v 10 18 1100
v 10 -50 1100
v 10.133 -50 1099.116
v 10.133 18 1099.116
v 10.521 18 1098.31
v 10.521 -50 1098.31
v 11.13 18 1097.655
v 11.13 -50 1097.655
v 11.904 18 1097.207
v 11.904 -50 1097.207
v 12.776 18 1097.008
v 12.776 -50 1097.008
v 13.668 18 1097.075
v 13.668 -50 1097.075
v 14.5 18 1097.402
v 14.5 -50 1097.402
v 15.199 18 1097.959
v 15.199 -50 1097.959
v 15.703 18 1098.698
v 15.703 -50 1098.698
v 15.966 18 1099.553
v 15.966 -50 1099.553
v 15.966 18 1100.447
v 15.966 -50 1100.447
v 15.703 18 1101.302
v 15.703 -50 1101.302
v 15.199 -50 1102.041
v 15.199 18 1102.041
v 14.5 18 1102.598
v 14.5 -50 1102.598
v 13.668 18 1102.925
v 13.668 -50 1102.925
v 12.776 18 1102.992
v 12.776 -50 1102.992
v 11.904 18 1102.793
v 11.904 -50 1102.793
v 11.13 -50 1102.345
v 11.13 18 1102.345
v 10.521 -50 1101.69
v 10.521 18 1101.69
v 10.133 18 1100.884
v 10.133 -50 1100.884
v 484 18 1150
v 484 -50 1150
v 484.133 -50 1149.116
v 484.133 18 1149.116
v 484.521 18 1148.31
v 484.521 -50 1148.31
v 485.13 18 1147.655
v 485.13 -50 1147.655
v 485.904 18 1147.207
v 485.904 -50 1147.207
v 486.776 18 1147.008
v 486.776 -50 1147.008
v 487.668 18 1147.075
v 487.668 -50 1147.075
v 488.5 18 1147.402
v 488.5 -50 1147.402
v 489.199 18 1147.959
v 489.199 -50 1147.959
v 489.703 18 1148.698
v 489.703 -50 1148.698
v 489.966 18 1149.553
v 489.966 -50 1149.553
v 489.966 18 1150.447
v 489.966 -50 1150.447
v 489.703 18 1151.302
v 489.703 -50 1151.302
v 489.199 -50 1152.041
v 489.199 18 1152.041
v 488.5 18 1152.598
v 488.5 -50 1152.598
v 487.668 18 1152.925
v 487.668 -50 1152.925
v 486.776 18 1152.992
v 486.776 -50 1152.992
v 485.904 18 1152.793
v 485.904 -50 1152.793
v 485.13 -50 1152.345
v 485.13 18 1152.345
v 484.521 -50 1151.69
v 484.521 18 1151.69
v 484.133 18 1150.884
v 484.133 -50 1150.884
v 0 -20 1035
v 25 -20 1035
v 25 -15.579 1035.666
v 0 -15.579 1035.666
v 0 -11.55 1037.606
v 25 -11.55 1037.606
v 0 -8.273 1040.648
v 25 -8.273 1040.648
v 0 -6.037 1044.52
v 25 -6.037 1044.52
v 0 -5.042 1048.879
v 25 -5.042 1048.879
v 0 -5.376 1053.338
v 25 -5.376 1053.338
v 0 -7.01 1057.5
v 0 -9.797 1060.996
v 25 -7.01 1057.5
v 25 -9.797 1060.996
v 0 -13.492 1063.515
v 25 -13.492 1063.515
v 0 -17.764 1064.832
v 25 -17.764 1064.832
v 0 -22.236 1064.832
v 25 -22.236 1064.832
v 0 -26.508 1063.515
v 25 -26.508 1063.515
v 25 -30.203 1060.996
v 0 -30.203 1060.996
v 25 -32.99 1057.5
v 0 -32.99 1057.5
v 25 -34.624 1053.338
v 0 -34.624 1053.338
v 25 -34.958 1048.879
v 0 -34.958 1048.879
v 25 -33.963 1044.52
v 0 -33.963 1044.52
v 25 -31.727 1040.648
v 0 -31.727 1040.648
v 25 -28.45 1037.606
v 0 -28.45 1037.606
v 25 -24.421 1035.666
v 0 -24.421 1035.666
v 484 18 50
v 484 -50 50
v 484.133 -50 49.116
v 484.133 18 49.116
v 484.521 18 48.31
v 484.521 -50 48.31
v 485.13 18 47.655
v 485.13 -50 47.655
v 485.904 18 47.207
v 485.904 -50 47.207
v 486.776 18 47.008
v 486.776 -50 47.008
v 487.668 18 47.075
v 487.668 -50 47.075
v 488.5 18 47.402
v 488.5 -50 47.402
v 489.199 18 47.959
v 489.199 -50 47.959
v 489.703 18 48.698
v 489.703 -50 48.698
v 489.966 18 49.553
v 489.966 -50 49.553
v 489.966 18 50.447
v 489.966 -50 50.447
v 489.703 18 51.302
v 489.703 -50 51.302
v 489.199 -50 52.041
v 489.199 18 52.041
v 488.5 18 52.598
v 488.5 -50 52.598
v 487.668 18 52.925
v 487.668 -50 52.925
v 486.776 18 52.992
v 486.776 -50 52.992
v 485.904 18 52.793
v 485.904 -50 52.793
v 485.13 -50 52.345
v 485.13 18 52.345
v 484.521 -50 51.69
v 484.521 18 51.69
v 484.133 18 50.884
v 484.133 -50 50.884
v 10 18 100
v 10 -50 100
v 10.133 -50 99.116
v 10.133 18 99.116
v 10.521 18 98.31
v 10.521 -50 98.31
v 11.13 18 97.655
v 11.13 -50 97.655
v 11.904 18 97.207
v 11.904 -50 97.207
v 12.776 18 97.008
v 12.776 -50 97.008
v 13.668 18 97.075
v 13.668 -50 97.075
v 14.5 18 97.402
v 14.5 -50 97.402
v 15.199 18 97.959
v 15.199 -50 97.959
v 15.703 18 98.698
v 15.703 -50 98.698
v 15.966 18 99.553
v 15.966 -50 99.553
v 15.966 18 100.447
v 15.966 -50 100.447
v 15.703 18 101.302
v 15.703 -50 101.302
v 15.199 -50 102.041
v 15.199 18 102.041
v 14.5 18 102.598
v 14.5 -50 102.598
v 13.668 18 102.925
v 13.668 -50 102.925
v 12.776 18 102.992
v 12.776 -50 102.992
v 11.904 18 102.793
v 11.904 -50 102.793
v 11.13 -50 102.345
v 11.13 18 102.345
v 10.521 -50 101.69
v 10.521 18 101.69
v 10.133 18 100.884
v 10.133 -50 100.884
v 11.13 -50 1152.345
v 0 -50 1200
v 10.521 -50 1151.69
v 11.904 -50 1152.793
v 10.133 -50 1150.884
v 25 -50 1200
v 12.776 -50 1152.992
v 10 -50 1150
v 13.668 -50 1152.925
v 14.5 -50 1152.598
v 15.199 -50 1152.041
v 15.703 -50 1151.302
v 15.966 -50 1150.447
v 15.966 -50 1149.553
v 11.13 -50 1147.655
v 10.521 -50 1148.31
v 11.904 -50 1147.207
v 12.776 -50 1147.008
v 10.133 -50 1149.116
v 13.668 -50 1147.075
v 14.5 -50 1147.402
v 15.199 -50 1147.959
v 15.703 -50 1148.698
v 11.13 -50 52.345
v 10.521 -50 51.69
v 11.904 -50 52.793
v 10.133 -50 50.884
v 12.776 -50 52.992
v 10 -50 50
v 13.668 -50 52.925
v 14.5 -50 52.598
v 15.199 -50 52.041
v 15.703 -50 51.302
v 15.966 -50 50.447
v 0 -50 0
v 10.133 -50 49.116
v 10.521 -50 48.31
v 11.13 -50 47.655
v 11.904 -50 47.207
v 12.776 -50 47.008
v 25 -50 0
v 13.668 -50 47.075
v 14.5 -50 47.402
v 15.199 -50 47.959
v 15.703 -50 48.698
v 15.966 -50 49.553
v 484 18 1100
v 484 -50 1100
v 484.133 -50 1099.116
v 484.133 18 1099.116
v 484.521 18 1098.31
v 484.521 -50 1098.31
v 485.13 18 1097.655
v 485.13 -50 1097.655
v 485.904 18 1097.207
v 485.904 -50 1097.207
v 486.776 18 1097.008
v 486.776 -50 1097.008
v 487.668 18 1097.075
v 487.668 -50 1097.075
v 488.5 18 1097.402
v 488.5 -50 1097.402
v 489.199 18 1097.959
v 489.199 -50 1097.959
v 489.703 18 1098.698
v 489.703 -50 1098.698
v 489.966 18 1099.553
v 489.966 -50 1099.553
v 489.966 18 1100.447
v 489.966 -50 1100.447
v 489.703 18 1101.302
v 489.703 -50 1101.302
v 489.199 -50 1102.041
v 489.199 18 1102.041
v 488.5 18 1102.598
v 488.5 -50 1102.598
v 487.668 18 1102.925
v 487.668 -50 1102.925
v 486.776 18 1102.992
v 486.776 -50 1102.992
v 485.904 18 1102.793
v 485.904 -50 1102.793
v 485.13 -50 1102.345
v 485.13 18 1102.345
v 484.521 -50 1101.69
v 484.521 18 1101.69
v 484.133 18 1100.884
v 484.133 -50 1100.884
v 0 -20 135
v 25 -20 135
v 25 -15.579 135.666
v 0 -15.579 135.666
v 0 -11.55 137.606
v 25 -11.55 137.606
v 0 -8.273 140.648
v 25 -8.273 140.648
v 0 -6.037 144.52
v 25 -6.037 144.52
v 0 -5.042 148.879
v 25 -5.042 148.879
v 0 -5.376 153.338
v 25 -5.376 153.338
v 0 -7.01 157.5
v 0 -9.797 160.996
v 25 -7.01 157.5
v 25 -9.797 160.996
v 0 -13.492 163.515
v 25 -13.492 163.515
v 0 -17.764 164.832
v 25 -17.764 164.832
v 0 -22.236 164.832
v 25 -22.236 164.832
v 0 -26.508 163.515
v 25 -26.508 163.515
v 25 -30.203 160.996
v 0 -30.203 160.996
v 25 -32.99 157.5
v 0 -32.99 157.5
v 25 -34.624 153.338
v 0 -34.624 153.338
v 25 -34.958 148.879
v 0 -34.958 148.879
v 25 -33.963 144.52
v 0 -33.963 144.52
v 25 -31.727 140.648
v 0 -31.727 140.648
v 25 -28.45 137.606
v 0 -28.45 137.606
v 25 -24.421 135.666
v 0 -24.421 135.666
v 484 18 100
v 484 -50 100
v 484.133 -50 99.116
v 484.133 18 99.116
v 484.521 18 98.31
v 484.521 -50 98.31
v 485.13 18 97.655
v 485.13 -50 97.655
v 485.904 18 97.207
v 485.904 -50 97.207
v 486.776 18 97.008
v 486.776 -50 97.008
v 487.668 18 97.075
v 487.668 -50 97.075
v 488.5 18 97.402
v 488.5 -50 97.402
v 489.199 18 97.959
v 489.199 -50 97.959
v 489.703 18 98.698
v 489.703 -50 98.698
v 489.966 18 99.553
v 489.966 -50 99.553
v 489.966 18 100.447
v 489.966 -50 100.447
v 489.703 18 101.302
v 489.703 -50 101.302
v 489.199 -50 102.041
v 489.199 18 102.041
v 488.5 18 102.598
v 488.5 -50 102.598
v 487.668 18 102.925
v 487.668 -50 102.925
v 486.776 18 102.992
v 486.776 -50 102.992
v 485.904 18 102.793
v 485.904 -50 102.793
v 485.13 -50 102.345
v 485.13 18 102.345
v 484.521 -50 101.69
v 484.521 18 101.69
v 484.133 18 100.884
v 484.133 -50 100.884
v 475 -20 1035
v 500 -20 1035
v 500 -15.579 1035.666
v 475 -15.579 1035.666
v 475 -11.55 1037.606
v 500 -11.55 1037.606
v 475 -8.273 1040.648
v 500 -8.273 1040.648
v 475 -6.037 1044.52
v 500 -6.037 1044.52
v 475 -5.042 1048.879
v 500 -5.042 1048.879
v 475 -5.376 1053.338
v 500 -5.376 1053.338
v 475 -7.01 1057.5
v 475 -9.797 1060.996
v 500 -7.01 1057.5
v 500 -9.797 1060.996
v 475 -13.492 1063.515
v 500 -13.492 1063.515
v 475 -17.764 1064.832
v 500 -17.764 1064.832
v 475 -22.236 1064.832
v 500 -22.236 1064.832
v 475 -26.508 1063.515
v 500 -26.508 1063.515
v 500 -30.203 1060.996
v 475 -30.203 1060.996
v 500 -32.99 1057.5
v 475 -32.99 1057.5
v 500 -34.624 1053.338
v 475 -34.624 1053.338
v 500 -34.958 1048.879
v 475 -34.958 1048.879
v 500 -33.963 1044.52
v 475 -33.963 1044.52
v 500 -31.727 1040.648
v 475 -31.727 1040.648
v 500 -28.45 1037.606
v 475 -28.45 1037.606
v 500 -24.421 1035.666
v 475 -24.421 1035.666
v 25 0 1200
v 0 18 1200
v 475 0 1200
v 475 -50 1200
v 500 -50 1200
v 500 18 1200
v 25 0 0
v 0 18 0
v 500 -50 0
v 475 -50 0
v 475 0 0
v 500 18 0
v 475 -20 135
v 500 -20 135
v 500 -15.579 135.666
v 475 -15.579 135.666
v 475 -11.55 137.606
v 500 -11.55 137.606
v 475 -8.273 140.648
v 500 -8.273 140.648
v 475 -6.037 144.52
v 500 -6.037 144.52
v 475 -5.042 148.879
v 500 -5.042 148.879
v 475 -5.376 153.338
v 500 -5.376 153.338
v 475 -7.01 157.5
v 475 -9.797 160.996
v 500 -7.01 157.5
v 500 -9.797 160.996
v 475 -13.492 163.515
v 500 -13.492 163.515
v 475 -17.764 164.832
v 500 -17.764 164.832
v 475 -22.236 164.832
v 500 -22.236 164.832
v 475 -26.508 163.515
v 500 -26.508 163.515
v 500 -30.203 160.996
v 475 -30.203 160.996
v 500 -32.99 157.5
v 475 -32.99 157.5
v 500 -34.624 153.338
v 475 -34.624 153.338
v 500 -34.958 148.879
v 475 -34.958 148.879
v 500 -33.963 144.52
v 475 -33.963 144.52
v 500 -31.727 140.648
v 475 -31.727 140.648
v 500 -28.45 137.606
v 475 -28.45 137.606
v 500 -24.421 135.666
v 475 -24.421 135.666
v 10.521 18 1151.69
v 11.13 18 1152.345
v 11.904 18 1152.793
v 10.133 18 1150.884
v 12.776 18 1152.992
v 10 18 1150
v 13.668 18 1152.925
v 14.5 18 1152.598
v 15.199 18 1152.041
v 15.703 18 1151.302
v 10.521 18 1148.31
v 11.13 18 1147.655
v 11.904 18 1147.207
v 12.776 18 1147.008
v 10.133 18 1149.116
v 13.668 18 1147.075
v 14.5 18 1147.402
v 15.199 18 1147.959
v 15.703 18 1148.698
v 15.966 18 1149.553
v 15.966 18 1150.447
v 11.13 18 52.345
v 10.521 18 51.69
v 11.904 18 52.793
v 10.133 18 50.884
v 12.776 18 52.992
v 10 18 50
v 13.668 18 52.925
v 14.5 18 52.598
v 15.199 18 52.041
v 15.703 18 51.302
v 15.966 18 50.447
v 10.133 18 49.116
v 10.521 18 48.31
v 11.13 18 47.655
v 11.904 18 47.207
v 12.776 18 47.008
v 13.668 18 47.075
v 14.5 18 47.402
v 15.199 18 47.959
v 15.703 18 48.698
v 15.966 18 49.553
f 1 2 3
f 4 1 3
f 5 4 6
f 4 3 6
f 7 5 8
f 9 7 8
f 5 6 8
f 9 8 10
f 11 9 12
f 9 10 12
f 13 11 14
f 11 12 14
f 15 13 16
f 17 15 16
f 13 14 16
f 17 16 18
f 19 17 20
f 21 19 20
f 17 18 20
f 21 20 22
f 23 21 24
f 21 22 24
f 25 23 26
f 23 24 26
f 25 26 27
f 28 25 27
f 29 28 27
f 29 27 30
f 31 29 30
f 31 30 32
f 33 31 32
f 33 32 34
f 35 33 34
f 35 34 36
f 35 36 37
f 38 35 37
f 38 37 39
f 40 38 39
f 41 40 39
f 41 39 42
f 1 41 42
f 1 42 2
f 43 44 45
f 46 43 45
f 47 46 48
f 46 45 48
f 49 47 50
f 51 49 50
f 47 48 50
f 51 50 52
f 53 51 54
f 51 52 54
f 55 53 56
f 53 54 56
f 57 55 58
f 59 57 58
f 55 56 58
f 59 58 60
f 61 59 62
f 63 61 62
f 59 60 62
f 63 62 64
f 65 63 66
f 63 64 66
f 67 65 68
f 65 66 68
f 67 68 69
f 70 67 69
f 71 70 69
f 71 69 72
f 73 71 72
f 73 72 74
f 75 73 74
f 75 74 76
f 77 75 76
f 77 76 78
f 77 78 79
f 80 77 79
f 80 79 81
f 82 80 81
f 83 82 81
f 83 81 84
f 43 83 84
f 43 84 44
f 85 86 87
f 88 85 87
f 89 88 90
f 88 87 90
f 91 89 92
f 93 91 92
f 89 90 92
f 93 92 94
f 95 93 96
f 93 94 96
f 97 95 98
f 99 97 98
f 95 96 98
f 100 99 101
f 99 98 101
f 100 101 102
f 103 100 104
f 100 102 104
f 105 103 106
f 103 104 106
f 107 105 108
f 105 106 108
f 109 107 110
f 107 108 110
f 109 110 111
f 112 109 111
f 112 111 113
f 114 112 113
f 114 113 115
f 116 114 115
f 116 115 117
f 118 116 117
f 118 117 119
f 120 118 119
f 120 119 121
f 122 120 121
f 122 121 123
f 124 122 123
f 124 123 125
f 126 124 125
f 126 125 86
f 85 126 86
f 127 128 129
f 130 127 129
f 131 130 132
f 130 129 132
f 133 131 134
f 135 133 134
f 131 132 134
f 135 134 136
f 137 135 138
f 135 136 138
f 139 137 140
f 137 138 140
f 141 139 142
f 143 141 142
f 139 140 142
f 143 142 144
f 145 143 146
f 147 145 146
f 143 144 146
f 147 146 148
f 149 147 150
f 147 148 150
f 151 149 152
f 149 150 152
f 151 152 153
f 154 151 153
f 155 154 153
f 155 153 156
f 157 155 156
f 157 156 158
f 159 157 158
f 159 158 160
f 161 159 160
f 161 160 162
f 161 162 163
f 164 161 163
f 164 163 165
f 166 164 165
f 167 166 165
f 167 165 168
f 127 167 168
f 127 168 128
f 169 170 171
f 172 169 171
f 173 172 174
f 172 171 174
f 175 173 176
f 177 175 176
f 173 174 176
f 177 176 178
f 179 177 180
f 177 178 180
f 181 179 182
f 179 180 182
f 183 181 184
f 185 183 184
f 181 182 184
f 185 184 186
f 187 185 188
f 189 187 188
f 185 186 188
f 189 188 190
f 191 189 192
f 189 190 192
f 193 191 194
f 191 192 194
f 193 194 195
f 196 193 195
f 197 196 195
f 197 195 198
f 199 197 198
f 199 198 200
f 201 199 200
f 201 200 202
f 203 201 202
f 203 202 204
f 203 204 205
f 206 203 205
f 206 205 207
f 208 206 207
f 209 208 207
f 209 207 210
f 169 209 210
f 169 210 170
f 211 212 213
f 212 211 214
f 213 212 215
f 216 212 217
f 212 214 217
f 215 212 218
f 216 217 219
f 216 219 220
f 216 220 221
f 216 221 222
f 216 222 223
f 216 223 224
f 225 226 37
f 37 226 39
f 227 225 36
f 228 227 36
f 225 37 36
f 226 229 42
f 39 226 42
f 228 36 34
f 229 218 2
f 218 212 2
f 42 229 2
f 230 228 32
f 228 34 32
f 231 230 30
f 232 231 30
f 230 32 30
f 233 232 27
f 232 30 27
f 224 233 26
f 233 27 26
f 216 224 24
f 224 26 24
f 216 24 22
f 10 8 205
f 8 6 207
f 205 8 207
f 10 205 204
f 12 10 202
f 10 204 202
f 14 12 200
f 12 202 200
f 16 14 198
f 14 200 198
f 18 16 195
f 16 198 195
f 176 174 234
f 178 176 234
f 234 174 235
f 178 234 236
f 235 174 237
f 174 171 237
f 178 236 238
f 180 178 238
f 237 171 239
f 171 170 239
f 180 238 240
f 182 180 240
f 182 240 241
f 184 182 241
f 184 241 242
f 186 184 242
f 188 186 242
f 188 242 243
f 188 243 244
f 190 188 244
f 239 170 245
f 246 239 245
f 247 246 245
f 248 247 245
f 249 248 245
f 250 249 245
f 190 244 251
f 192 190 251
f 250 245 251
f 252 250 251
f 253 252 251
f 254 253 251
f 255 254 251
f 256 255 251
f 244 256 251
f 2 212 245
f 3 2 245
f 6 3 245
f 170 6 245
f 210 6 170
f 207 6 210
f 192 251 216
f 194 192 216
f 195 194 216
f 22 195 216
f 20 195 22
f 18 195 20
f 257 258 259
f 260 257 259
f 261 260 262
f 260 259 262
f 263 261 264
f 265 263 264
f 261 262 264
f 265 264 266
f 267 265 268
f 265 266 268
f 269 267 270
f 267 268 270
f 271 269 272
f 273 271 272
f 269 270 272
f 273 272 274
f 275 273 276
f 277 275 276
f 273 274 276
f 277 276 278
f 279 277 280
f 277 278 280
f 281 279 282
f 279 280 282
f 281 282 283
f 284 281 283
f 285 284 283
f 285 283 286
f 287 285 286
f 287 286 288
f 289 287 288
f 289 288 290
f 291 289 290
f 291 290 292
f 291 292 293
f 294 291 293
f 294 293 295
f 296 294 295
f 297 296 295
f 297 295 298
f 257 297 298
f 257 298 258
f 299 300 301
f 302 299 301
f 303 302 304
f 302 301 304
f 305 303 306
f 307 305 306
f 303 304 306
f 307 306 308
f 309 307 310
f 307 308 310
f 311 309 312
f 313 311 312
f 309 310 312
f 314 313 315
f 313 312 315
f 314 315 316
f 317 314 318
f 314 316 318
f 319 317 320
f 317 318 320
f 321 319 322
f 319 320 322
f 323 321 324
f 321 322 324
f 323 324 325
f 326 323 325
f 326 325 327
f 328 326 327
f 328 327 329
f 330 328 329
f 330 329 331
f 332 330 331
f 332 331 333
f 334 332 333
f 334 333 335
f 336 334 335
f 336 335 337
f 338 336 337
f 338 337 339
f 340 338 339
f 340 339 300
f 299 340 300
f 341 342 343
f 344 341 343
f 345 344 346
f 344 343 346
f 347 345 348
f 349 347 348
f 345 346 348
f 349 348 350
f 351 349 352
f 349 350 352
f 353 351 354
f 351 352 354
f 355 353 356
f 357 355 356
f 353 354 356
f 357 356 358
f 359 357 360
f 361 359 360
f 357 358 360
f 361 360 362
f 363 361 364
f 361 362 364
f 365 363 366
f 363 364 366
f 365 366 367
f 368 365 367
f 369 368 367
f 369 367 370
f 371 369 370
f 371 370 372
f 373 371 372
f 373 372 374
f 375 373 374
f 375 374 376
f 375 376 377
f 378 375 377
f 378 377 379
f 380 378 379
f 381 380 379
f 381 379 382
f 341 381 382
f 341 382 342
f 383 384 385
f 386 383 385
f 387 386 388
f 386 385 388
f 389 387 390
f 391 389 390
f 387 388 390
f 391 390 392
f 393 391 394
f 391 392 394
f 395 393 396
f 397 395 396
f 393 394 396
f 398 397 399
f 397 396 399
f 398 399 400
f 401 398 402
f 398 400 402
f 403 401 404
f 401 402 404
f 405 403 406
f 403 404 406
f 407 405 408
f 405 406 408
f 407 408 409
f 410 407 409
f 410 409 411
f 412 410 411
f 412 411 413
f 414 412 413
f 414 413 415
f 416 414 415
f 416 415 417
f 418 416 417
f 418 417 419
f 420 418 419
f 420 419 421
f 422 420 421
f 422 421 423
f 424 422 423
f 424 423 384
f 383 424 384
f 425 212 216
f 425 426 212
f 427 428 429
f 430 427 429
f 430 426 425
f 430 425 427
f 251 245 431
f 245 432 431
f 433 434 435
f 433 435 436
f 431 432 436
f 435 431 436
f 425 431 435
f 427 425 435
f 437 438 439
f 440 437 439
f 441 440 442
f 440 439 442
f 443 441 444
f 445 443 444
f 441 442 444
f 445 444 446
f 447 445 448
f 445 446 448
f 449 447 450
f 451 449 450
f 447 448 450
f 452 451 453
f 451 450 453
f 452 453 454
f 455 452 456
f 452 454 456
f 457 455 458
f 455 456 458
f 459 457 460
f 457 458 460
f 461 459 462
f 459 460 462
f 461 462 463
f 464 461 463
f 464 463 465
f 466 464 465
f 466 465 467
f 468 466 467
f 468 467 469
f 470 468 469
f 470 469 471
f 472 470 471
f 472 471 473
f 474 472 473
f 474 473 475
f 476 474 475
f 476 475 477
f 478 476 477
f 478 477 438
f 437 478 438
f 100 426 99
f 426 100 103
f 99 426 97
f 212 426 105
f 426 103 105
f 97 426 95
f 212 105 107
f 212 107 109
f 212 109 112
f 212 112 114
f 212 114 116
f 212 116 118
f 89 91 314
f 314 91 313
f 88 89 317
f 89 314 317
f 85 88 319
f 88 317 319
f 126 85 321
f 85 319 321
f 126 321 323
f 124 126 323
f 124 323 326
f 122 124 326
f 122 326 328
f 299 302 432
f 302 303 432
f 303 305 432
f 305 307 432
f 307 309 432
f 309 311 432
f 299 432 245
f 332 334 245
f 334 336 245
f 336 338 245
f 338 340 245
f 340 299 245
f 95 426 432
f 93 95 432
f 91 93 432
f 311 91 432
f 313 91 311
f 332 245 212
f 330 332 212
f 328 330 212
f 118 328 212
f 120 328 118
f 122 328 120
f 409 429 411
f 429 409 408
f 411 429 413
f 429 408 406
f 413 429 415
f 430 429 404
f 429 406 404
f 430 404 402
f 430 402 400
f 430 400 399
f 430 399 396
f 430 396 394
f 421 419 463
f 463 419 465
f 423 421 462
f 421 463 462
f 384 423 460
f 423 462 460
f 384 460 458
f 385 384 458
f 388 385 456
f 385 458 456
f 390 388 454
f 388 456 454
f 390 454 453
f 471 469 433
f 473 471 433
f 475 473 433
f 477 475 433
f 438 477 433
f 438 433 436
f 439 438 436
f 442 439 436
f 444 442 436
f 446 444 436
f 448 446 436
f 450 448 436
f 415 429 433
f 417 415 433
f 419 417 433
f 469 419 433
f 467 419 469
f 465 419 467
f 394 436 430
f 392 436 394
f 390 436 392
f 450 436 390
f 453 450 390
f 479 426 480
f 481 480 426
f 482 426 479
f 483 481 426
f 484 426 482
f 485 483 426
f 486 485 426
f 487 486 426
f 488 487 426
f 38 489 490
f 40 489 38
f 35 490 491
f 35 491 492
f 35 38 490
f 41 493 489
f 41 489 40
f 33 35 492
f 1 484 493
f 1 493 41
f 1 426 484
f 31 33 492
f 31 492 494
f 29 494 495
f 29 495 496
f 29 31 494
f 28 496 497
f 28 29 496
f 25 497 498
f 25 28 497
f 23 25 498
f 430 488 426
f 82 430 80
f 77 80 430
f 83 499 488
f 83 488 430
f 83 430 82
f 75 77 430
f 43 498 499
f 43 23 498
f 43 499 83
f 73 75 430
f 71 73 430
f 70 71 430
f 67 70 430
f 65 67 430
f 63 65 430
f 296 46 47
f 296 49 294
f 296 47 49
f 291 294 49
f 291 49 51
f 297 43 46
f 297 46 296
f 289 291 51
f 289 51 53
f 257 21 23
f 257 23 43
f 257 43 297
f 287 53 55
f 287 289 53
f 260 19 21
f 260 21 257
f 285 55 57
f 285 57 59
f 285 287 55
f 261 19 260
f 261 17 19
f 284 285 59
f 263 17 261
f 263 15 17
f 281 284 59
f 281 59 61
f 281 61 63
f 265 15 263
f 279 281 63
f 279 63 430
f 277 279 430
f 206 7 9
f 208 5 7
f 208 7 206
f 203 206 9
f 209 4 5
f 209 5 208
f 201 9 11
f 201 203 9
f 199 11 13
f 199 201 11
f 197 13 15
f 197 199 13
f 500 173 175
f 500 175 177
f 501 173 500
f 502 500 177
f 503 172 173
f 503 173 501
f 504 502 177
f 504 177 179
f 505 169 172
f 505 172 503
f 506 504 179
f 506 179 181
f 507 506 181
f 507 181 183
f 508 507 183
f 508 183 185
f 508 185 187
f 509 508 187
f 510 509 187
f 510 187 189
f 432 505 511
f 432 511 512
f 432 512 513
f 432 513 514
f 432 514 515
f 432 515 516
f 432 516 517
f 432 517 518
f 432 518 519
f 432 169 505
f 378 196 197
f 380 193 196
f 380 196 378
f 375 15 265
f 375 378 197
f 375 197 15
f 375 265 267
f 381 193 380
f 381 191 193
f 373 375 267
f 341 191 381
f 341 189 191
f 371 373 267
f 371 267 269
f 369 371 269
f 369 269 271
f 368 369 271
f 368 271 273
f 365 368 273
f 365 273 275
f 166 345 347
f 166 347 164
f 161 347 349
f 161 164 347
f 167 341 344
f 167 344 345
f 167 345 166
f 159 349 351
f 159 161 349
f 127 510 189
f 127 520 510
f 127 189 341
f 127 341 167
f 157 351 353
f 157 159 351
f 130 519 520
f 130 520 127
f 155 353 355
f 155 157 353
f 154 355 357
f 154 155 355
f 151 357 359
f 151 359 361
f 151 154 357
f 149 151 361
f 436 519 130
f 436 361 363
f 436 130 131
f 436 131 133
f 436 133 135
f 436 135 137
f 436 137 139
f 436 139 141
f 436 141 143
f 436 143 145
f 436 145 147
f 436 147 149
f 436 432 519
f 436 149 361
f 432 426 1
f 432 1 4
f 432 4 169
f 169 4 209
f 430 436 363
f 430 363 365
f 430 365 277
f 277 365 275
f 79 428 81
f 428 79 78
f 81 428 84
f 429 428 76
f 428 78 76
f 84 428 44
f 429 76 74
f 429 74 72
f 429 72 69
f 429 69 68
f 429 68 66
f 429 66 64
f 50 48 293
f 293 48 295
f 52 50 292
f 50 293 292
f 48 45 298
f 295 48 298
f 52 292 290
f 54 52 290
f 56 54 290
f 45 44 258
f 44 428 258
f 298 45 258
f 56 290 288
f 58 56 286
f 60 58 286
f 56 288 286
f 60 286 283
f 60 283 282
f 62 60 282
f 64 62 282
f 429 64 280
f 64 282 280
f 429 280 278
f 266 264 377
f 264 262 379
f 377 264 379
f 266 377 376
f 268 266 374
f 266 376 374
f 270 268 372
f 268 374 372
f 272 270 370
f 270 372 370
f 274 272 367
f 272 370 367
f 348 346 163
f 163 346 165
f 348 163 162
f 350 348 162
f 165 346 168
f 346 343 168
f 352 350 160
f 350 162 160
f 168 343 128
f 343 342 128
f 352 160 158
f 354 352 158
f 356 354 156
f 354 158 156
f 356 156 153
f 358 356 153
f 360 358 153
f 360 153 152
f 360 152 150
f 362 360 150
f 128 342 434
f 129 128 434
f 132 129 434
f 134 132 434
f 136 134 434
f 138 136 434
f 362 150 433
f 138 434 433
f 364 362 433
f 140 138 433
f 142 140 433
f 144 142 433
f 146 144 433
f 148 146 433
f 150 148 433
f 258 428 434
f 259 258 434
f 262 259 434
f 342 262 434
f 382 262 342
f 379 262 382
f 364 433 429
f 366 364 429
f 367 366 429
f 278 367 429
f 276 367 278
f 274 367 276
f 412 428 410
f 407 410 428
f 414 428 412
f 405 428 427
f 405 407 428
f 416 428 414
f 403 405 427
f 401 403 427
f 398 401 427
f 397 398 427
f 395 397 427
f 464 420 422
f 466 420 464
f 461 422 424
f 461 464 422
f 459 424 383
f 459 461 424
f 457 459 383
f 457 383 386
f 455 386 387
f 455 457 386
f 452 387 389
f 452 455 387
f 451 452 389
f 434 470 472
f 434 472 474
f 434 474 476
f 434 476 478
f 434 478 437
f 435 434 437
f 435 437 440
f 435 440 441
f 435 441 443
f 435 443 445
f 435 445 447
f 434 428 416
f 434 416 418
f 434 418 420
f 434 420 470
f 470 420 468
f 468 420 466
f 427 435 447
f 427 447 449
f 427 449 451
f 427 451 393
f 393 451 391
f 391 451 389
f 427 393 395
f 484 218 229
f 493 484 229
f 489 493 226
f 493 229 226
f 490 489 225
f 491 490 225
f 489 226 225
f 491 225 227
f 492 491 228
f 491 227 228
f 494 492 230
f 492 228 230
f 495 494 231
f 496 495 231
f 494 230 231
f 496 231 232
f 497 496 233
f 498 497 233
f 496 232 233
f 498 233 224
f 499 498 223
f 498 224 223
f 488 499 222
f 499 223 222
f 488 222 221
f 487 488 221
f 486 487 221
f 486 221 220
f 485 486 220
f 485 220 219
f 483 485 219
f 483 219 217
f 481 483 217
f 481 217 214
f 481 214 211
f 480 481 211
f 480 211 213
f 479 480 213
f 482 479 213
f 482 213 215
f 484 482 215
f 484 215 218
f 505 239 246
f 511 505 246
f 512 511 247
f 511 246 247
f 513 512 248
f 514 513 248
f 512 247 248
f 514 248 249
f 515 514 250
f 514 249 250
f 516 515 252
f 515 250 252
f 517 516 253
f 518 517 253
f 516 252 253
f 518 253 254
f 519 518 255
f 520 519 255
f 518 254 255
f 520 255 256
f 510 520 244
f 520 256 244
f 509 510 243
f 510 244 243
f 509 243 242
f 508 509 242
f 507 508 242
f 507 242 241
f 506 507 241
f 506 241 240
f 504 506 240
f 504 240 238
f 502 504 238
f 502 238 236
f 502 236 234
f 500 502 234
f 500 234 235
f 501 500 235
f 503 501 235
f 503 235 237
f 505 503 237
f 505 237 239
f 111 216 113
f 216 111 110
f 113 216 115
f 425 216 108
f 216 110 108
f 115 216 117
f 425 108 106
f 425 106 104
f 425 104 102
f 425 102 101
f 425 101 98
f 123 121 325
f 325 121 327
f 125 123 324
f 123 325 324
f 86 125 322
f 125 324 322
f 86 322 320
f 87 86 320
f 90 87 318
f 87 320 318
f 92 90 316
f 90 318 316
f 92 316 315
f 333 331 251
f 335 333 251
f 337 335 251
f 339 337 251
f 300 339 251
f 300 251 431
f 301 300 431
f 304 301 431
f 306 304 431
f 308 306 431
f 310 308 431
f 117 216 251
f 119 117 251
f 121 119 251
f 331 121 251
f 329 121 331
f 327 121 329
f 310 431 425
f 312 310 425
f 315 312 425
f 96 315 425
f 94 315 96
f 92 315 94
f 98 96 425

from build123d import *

# Parameters (mm, degrees)
SKETCH1_W                = 25
SKETCH1_H                = 50
SKETCH1_W_2              = 500
SKETCH1_H_2              = 18
BOSS_EXTRUDE1_DEPTH      = 1200
SKETCH2_R                = 15
CUT_EXTRUDE1_DEPTH       = 1
CUT_EXTRUDE1_DEPTH_BACK  = 501
F_6_0_6_DIAMETER_HOLE1_D = 6
LPATTERN1_COUNT          = 2
LPATTERN1_PITCH          = 50
LPATTERN1_COUNT_DIR2     = 2
LPATTERN1_PITCH_DIR2     = 474
LPATTERN2_COUNT          = 2
LPATTERN2_PITCH          = 1050
LPATTERN2_COPY_1_D       = 6
LPATTERN2_COPY_2_D       = 6
LPATTERN2_COPY_3_D       = 6


with BuildPart() as part:
    # Sketch1 → Boss-Extrude1 (new body)
    with BuildSketch(Plane.XY):
        with Locations((12.5, -25)):
            Rectangle(SKETCH1_W, SKETCH1_H)
        with Locations((250, 9)):
            Rectangle(SKETCH1_W_2, SKETCH1_H_2)
        with Locations((487.5, -25)):
            Rectangle(SKETCH1_W, SKETCH1_H)
    extrude(amount=BOSS_EXTRUDE1_DEPTH)

    # Sketch2 → Cut-Extrude1 (cut, two sides)
    with BuildSketch(Plane(origin=(500, 0, 0), x_dir=(0, 0, -1), z_dir=(1, 0, 0))) as cut_extrude1_sk:
        with Locations((-1050, -20)):
            Circle(SKETCH2_R)
        with Locations((-150, -20)):
            Circle(SKETCH2_R)
    extrude(amount=CUT_EXTRUDE1_DEPTH, mode=Mode.SUBTRACT)
    extrude(cut_extrude1_sk.sketch, amount=-CUT_EXTRUDE1_DEPTH_BACK, mode=Mode.SUBTRACT)

    # Ø6.0 (6) Diameter Hole1 (through all)
    with Locations(Plane(origin=(0, 18, 0), x_dir=(1, 0, 0), z_dir=(0, 1, 0))):
        with Locations((13, -1150)):
            f_6_0_6_diameter_hole1 = Hole(F_6_0_6_DIAMETER_HOLE1_D / 2)

    # LPattern1: 6.0 _6_ Diameter Hole1 2 × 2
    with Locations(*[(j * LPATTERN1_PITCH_DIR2, 0, -i * LPATTERN1_PITCH) for i in range(LPATTERN1_COUNT) for j in range(LPATTERN1_COUNT_DIR2) if (i, j) != (0, 0)]):
        add(f_6_0_6_diameter_hole1, mode=Mode.SUBTRACT)

    # LPattern2: Ø6.0 (6) Diameter Hole1 ×2
    with Locations(*[(0, 0, -i * LPATTERN2_PITCH) for i in range(1, LPATTERN2_COUNT)]):
        add(f_6_0_6_diameter_hole1, mode=Mode.SUBTRACT)

    # LPattern2 copy 1 (through all)
    with Locations(Plane(origin=(474, 18, -1050), x_dir=(1, 0, 0), z_dir=(0, 1, 0))):
        with Locations((13, -1150)):
            Hole(LPATTERN2_COPY_1_D / 2)

    # LPattern2 copy 2 (through all)
    with Locations(Plane(origin=(0, 18, -1100), x_dir=(1, 0, 0), z_dir=(0, 1, 0))):
        with Locations((13, -1150)):
            Hole(LPATTERN2_COPY_2_D / 2)

    # LPattern2 copy 3 (through all)
    with Locations(Plane(origin=(474, 18, -1100), x_dir=(1, 0, 0), z_dir=(0, 1, 0))):
        with Locations((13, -1150)):
            Hole(LPATTERN2_COPY_3_D / 2)


solid = part.part
